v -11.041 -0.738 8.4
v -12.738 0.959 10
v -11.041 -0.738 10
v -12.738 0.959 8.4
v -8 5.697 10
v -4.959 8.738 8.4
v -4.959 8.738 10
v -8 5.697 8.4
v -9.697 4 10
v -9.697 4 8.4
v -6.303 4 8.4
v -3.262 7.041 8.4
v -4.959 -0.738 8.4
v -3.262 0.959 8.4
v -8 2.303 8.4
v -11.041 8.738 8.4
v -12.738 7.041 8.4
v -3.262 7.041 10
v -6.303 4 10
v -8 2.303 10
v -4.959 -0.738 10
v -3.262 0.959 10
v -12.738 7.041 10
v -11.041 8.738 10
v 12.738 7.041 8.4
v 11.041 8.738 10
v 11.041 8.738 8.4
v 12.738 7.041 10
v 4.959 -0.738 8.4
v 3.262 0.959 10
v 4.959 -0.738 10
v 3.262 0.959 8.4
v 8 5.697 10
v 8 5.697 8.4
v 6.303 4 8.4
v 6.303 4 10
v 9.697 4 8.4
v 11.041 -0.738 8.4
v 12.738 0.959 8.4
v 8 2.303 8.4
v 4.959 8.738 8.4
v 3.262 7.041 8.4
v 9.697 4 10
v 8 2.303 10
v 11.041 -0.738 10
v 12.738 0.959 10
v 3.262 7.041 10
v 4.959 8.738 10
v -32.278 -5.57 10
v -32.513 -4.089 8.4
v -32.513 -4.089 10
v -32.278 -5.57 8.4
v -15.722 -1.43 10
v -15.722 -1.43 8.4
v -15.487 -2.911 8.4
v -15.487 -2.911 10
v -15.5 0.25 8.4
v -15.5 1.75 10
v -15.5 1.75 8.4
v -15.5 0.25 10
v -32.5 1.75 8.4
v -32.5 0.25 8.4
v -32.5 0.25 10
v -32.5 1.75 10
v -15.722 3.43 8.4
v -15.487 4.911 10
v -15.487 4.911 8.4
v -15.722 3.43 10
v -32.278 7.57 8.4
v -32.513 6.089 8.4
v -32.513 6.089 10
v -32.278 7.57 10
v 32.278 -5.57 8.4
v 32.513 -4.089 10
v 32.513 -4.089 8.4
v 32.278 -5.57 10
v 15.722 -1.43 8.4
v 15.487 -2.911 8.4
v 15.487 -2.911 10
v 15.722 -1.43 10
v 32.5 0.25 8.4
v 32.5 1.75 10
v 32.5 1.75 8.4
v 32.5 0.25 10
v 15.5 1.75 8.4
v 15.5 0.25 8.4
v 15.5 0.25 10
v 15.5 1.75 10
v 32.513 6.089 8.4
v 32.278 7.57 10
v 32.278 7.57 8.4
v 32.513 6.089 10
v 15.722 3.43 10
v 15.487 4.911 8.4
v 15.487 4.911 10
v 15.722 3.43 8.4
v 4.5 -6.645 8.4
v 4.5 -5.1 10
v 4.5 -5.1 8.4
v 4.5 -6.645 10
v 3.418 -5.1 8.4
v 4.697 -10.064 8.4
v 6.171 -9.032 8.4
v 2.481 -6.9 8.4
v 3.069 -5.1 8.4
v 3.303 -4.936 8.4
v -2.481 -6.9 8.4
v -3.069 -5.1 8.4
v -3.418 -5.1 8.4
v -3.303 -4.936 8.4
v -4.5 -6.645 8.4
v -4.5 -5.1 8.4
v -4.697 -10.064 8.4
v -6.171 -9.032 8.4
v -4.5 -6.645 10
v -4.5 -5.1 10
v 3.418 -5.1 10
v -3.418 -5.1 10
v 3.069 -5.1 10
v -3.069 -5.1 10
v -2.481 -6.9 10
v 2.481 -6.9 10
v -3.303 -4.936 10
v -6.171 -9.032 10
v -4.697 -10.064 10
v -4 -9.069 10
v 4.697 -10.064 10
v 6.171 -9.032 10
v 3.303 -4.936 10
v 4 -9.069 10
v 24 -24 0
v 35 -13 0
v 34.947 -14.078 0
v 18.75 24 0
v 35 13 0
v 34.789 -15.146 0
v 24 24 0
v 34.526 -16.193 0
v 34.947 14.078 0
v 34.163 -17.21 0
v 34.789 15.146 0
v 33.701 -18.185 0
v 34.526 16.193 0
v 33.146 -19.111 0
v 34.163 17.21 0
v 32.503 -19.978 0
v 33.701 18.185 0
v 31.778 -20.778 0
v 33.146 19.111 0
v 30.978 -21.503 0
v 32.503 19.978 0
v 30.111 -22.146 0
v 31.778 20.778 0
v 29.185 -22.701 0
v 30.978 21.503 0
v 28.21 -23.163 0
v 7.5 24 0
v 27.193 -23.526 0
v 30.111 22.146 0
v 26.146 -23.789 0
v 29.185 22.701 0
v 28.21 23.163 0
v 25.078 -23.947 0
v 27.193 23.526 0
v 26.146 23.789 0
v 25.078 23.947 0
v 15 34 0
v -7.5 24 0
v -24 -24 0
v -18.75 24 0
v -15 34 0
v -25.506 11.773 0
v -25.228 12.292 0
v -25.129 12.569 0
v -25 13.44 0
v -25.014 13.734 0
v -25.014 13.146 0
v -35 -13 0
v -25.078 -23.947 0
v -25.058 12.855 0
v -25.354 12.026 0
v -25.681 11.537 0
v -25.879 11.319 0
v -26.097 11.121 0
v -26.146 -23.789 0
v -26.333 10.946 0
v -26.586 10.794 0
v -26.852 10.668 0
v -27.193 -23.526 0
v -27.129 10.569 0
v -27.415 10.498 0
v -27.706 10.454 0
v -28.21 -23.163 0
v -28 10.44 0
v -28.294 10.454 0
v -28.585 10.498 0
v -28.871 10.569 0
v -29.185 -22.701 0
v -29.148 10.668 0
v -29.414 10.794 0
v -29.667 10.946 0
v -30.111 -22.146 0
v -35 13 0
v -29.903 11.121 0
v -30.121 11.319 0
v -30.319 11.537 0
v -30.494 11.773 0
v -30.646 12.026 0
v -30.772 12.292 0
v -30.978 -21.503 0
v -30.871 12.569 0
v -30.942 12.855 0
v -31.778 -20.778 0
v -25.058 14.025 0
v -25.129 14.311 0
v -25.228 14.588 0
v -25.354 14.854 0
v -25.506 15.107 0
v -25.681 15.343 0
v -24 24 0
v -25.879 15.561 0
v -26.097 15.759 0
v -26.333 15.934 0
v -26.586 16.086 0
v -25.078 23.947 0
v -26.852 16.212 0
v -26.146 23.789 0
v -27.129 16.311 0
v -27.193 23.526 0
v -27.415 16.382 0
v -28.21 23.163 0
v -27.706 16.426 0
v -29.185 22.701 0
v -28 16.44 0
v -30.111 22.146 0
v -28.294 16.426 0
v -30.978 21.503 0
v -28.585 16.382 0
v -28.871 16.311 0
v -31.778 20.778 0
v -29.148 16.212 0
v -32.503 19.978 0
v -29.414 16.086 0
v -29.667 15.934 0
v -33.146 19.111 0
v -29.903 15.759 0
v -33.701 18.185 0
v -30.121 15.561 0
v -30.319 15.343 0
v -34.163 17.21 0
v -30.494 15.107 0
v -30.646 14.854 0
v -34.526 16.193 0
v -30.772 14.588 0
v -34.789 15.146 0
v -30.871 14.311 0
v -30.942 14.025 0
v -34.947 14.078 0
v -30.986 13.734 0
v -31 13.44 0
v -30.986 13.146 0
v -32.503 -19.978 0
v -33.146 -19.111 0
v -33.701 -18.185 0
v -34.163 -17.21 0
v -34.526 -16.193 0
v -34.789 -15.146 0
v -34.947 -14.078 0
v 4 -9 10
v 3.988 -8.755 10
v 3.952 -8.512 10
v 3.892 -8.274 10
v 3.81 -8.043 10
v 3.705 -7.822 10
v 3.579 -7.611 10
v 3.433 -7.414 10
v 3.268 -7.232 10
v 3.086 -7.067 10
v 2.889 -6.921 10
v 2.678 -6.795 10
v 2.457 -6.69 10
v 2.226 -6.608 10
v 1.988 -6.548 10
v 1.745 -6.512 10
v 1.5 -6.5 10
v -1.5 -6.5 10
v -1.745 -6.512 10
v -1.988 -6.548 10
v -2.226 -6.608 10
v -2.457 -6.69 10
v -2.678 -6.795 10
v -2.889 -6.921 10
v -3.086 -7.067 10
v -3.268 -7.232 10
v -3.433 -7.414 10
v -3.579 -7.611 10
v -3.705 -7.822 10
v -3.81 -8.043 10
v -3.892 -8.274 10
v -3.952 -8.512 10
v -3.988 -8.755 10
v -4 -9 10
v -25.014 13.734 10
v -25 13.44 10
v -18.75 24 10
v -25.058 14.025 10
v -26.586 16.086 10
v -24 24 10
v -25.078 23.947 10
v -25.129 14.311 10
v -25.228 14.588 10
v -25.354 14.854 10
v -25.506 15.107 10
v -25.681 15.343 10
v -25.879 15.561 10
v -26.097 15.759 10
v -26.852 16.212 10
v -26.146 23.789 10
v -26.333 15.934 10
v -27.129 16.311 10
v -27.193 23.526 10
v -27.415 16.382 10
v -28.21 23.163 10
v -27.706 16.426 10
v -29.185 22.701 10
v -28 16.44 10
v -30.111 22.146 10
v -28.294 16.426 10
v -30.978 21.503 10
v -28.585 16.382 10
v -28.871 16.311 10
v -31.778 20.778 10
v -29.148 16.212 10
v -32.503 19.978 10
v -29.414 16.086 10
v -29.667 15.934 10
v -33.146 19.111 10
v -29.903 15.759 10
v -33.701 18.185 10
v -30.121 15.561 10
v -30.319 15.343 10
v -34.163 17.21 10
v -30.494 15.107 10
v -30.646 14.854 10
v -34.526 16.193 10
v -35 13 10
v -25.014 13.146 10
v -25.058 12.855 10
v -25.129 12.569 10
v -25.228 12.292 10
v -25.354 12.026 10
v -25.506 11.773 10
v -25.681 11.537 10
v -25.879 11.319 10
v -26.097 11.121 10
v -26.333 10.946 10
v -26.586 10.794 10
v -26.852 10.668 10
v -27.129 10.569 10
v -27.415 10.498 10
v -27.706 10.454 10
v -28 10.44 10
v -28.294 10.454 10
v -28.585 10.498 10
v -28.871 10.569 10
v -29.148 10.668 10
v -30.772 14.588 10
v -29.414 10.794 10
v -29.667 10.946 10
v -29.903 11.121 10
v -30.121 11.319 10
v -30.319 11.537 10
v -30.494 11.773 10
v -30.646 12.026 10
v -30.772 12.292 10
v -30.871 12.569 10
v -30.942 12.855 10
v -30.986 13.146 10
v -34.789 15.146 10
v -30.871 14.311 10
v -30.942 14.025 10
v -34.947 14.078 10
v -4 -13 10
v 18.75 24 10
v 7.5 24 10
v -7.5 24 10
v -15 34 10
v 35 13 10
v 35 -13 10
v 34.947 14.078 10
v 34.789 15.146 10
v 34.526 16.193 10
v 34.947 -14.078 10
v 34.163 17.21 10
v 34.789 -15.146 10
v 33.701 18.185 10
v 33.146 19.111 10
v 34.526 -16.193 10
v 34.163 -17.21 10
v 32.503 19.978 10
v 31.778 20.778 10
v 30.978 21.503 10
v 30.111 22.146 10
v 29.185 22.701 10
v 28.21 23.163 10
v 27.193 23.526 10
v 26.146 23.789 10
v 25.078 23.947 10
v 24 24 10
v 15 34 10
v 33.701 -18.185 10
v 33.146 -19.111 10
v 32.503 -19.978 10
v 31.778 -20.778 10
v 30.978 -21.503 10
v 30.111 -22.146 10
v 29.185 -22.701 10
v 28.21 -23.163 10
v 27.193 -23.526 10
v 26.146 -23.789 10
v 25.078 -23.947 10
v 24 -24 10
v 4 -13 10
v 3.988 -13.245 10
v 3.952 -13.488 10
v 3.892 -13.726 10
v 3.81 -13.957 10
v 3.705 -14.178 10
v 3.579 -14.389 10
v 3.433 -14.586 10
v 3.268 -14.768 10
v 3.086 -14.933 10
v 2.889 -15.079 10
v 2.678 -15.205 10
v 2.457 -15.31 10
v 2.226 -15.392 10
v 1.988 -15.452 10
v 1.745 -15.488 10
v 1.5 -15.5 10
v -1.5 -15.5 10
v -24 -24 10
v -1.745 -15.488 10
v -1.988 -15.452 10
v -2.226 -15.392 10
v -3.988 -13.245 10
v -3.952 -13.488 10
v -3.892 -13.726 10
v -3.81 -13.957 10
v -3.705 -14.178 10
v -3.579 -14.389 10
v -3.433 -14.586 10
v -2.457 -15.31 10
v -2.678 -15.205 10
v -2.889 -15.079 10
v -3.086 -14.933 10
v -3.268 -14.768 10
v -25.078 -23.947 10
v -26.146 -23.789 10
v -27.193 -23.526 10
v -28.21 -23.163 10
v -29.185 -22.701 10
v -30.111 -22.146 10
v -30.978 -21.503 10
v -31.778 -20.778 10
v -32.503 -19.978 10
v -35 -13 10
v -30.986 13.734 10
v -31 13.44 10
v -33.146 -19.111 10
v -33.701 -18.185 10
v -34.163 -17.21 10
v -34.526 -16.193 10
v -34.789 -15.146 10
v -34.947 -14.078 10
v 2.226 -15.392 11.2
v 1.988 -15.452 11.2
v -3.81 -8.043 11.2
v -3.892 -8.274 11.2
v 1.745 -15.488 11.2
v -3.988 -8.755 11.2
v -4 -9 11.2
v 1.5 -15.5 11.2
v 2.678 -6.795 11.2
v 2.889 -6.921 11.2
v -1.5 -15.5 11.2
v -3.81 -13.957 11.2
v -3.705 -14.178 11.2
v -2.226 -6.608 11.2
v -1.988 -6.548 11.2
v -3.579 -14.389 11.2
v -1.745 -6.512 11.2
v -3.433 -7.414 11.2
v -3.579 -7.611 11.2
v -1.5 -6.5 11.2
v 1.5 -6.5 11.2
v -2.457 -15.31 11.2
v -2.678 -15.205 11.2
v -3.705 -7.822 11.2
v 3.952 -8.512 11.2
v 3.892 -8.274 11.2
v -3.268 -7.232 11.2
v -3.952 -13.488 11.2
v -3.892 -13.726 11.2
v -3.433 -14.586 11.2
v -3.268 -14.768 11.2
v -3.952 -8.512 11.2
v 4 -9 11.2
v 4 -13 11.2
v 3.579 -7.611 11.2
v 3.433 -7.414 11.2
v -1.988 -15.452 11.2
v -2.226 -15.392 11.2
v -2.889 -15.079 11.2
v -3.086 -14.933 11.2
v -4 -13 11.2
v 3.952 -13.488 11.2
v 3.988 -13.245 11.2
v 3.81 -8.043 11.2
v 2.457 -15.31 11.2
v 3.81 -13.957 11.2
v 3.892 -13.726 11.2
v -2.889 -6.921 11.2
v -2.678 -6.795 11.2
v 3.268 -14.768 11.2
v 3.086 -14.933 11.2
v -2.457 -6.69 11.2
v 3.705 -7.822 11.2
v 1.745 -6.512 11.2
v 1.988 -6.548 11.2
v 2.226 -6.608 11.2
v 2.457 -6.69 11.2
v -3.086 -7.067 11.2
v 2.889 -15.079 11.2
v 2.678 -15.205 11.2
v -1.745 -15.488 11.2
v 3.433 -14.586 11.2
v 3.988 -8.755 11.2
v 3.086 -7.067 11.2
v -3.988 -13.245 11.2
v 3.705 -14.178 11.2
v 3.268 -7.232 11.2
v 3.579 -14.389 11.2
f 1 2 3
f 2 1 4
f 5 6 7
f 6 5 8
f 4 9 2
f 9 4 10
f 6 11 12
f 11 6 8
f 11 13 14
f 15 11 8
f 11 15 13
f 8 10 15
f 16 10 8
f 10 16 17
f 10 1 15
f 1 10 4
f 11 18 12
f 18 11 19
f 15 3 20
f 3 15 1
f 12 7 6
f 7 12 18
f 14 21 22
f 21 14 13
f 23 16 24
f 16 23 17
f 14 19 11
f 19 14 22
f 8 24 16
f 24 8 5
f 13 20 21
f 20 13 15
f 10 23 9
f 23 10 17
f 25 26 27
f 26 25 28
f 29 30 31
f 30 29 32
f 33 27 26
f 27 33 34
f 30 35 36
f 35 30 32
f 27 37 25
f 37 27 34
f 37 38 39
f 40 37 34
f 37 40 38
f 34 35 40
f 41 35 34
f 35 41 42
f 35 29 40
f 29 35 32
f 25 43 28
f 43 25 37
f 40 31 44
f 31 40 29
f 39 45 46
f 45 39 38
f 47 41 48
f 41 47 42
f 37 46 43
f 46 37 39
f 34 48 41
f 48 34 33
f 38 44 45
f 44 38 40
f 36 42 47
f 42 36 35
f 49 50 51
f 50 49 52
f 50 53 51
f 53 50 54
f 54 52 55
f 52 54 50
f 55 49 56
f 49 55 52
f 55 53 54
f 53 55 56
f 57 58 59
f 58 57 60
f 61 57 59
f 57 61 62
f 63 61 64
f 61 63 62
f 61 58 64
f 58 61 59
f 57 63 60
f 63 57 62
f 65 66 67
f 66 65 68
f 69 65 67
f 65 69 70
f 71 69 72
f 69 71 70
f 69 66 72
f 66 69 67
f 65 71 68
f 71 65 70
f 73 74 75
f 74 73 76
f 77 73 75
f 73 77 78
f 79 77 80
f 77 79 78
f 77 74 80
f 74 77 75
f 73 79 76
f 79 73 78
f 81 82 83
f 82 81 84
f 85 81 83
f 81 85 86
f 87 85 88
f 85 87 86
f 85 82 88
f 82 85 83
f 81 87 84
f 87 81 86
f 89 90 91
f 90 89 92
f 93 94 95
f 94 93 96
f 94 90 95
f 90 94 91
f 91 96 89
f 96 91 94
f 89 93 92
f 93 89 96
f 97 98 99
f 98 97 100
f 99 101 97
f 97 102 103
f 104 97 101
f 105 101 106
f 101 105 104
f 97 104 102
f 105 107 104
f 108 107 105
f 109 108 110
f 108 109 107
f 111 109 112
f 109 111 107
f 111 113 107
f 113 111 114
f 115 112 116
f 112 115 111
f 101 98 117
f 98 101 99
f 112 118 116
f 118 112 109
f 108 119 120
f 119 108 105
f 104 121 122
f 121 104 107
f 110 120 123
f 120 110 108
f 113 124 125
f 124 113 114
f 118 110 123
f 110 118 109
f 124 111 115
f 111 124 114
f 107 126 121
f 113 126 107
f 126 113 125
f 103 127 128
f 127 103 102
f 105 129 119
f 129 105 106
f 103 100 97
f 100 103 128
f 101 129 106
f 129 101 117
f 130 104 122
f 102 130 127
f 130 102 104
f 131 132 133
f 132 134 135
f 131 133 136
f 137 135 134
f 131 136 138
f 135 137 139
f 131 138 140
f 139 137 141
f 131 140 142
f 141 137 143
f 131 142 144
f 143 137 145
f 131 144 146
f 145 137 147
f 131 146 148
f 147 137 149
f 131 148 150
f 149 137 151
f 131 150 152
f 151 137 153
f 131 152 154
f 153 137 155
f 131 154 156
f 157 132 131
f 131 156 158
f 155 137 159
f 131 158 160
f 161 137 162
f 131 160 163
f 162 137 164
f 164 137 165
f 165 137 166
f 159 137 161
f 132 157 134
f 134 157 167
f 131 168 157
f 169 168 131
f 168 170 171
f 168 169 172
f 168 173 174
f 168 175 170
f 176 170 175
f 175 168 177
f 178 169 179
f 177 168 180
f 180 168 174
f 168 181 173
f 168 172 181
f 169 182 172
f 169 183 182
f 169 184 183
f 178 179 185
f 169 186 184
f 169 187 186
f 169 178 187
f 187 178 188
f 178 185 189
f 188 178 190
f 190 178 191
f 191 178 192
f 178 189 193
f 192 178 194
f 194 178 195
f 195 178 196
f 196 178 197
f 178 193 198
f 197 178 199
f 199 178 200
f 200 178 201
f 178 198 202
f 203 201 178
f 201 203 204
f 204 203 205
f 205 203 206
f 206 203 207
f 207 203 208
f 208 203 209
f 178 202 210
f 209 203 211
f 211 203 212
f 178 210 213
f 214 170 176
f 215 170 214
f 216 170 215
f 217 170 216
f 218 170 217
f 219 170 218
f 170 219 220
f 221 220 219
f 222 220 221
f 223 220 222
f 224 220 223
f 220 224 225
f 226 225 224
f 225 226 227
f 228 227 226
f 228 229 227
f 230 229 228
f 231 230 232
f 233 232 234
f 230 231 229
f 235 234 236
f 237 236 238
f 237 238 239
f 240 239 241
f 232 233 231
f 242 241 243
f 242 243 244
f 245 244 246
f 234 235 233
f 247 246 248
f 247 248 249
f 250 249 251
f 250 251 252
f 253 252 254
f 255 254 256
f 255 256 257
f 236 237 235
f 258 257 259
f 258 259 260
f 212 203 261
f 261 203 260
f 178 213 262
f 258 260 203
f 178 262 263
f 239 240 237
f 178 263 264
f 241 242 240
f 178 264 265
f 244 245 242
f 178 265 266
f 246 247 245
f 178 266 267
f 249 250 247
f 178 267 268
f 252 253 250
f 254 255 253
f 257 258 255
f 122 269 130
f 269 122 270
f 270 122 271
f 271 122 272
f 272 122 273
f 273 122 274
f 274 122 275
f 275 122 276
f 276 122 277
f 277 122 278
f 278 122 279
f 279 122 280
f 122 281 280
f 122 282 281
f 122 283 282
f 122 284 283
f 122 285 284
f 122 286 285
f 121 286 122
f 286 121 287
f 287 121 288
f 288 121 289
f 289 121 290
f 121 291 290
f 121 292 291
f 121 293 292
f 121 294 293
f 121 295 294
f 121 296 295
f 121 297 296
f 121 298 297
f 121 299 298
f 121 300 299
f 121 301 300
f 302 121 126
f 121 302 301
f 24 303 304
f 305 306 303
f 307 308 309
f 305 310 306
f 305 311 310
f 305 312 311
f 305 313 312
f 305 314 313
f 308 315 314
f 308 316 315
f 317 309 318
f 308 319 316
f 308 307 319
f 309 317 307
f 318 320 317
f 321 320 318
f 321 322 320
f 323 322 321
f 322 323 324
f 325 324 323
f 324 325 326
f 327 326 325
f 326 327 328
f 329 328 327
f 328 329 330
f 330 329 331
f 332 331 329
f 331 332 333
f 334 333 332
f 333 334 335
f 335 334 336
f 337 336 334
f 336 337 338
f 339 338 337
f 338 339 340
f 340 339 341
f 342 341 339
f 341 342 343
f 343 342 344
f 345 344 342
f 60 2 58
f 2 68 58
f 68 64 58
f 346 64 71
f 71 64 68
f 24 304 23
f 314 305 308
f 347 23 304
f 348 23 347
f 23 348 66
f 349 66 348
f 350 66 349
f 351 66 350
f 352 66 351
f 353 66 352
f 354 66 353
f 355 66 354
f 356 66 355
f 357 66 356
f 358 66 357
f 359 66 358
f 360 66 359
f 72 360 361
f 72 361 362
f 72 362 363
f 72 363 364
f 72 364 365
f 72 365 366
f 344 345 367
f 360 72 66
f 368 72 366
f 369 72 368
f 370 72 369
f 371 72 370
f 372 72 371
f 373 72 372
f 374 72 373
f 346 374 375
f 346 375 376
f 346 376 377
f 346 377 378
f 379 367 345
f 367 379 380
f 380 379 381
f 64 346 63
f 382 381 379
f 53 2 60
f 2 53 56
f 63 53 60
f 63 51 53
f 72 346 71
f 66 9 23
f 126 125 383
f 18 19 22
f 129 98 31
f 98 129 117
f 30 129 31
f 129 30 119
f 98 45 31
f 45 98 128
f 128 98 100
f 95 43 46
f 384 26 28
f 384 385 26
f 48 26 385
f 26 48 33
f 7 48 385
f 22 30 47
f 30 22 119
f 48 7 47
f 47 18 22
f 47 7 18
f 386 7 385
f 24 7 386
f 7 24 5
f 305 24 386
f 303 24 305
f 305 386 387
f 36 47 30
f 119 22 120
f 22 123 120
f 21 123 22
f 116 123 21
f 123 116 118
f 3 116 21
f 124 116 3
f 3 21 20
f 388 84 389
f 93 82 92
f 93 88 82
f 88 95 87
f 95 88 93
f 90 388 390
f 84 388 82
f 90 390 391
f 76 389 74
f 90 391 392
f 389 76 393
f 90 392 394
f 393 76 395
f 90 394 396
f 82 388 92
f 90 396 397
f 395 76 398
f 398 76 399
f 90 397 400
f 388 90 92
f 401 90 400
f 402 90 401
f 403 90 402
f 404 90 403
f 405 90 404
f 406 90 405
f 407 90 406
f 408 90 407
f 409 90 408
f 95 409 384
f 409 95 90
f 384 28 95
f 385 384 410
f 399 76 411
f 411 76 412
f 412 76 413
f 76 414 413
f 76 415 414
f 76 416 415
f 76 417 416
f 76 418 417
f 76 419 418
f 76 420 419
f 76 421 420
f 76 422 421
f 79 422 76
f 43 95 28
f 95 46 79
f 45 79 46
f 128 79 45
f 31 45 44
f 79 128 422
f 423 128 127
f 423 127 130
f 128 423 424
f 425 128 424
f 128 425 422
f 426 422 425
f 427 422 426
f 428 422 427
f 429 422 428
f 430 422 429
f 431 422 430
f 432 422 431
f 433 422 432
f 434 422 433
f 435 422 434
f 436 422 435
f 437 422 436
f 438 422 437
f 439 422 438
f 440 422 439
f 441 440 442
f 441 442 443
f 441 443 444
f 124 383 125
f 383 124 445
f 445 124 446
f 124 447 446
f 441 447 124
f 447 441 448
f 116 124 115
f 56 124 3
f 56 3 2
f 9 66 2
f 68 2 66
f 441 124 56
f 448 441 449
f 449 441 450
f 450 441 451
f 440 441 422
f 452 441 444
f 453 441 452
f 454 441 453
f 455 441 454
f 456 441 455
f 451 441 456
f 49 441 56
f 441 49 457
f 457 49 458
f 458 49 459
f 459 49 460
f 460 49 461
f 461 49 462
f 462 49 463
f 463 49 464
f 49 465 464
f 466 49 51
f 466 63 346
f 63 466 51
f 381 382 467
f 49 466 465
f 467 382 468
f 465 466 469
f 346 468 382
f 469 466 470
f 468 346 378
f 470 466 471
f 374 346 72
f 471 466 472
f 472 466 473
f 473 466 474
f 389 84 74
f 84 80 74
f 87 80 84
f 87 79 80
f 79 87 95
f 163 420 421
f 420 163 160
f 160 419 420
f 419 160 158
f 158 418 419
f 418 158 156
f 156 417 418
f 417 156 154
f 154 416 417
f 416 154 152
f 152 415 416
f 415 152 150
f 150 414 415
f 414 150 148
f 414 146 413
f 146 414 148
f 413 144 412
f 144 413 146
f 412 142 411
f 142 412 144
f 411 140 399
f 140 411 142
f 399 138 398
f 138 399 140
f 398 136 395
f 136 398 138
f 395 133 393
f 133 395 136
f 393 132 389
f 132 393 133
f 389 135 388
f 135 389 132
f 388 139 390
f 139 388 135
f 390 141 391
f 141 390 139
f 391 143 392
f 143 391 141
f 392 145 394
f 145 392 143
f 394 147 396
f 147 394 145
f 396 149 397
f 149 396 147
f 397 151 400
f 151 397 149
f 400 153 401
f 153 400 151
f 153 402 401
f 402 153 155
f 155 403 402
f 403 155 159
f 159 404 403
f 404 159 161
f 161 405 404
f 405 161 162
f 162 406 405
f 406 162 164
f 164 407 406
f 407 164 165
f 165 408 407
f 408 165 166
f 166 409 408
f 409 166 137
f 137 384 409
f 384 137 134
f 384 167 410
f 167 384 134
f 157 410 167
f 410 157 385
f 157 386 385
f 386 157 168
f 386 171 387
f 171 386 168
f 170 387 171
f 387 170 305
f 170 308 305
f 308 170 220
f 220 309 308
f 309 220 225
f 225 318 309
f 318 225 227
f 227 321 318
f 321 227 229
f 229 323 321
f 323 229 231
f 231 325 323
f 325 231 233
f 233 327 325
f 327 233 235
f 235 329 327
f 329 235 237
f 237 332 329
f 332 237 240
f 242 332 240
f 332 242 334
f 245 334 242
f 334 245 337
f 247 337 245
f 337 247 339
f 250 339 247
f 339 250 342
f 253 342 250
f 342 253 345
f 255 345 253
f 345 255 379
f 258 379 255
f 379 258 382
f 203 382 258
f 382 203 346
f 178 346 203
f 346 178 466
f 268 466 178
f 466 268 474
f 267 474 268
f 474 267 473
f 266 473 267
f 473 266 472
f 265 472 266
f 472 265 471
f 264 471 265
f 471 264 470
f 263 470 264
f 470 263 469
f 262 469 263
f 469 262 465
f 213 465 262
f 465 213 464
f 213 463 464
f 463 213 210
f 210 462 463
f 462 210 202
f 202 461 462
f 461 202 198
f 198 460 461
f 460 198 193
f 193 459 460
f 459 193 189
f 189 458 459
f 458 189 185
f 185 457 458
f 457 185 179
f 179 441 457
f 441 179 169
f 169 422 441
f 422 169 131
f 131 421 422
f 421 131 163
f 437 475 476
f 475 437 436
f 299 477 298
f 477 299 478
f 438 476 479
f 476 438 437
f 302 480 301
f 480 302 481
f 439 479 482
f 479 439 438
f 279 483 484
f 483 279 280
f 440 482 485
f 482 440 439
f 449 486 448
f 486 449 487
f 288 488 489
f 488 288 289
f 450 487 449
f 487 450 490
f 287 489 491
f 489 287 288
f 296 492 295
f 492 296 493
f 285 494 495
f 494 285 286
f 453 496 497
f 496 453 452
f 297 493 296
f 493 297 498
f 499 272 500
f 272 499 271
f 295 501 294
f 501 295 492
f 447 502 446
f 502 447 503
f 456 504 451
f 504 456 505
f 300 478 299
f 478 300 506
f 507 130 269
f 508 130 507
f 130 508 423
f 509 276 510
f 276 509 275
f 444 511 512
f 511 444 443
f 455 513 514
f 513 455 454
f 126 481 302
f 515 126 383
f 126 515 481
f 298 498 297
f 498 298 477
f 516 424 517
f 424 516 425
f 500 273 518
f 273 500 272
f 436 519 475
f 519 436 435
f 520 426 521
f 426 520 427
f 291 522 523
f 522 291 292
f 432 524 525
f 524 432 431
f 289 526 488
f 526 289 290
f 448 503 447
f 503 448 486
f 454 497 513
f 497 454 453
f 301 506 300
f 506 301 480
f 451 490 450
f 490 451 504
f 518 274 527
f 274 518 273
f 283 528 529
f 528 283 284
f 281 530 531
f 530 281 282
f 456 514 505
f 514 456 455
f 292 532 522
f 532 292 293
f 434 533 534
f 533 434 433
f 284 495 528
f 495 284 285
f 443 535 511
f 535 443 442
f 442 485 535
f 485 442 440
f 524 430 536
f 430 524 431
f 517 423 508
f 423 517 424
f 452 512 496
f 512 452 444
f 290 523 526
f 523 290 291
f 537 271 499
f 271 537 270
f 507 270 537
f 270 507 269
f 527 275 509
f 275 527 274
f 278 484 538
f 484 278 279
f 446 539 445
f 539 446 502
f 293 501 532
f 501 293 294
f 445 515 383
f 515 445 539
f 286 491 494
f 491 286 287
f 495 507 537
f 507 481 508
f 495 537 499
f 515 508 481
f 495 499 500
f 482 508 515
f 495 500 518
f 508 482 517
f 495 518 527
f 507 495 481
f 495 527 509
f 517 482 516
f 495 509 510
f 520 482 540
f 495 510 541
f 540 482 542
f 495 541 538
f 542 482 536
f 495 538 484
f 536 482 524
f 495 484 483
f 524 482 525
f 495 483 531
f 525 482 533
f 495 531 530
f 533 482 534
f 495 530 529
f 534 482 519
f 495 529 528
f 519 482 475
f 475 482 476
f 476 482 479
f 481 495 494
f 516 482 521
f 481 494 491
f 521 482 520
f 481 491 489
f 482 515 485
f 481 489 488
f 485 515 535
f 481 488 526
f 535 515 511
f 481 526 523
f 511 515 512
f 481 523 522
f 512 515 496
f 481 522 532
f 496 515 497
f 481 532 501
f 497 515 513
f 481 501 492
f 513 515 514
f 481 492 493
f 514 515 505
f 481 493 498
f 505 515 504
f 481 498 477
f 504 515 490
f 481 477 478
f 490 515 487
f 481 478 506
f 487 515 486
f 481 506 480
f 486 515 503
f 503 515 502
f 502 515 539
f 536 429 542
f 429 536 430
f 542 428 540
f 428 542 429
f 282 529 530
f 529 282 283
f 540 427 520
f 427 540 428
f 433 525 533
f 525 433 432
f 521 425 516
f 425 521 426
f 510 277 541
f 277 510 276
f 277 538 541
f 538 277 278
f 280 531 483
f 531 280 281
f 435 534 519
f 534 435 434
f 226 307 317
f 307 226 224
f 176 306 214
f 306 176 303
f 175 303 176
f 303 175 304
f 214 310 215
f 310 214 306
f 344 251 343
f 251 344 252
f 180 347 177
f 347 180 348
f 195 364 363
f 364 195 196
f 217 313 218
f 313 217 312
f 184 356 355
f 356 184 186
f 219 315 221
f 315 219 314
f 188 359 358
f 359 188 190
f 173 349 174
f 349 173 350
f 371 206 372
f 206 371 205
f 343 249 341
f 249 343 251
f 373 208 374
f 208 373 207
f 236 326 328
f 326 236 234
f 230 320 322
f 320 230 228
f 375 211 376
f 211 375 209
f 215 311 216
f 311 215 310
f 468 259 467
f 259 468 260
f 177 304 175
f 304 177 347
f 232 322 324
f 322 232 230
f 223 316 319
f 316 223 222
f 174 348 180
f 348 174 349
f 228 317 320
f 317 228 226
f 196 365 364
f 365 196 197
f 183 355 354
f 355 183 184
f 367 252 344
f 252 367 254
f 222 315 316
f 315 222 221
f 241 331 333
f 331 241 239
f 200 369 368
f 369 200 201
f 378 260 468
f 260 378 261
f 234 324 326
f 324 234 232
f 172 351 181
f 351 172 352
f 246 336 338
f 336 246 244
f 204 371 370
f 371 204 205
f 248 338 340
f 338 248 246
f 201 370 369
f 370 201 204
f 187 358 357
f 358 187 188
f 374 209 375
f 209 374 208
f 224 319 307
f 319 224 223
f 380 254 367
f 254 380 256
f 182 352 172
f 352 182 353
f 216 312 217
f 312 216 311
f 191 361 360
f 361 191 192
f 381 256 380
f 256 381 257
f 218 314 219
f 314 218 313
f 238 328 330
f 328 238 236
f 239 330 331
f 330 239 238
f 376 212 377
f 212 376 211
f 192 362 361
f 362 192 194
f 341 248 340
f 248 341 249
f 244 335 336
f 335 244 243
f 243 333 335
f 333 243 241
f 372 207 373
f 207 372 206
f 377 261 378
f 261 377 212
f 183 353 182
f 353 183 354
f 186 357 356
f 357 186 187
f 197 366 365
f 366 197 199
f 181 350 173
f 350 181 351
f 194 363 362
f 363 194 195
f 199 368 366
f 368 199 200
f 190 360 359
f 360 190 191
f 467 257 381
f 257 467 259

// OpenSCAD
// ============================================================
//  LuxeStyle - Flache Kawaii-Katze (Hosentaschen-Anhaenger)
//  Flach liegend, taschentauglich. Gesicht GEZEICHNET/graviert:
//  X-Augen, Schnurrhaare, Zunge raus. Eigenes Design, frei verkaufbar.
//  Rendern: openscad -o kawaii_cat.stl kawaii_cat.scad
// ============================================================

length    = 70;   // Laenge in mm (50-90 je nach Typ)
width     = 48;   // Breite in mm
thick     = 10;   // Dicke in mm (flach fuer die Tasche)
edge_r    = 11;   // Rundung der Silhouette
face_depth = 1.3; // Gravurtiefe (Augen/Schnurrhaare/Mund)
tongue_h  = 1.2;  // Zunge erhaben (spaeter farbig)
ring_d    = 6;    // Schluesselring-Loch
$fn = 64;

// Kopf-/Gesichtszentrum (zentriert)
fx = 0;
fy = 1;
top = thick;

// ---- Silhouette: Loaf-Koerper + Ohren ----
module blob2d() {
    union() {
        offset(edge_r) offset(-edge_r) square([length, width], center = true);
        for (s = [-1, 1])                       // Ohren oben am Kopf
            translate([fx + s * 12, width / 2 - 5])
                polygon([[-9, -1], [9, -1], [s * 3, 15]]);
    }
}

// ---- Gravur-Elemente (werden vom Koerper abgezogen) ----
module bar(px, py, len, w, ang) {
    translate([px, py, top - face_depth / 2])
        rotate([0, 0, ang])
            cube([len, w, face_depth + 0.6], center = true);
}
module x_eye(px, py) { bar(px, py, 11, 2.4, 45); bar(px, py, 11, 2.4, -45); }
module whiskers(px, py, dir) {
    for (i = [-1, 0, 1]) bar(px + dir * 9, py + i * 4.5, 17, 1.5, dir * i * 9);
}
module mouth() { bar(fx, fy - 7, 9, 1.8, 0); bar(fx - 4, fy - 8.5, 5, 1.8, 55); bar(fx + 4, fy - 8.5, 5, 1.8, -55); }

module engrave() {
    x_eye(fx - 8, fy + 3);
    x_eye(fx + 8, fy + 3);
    whiskers(fx - 15, fy, -1);
    whiskers(fx + 15, fy, +1);
    mouth();
}

// ---- erhabene Zunge (unter dem Mund) ----
module tongue() {
    translate([fx, fy - 12, top])
        linear_extrude(tongue_h)
            offset(2.5) offset(-2.5) square([8, 9], center = true);
}

// ---- Zusammenbau ----
difference() {
    union() {
        difference() {
            linear_extrude(thick) blob2d();
            engrave();
        }
        tongue();
    }
    // Schluesselring-Loch oben links (Ecke), durch die Dicke
    translate([-length * 0.40, width * 0.28, -1])
        cylinder(d = ring_d, h = thick + 2);
}
